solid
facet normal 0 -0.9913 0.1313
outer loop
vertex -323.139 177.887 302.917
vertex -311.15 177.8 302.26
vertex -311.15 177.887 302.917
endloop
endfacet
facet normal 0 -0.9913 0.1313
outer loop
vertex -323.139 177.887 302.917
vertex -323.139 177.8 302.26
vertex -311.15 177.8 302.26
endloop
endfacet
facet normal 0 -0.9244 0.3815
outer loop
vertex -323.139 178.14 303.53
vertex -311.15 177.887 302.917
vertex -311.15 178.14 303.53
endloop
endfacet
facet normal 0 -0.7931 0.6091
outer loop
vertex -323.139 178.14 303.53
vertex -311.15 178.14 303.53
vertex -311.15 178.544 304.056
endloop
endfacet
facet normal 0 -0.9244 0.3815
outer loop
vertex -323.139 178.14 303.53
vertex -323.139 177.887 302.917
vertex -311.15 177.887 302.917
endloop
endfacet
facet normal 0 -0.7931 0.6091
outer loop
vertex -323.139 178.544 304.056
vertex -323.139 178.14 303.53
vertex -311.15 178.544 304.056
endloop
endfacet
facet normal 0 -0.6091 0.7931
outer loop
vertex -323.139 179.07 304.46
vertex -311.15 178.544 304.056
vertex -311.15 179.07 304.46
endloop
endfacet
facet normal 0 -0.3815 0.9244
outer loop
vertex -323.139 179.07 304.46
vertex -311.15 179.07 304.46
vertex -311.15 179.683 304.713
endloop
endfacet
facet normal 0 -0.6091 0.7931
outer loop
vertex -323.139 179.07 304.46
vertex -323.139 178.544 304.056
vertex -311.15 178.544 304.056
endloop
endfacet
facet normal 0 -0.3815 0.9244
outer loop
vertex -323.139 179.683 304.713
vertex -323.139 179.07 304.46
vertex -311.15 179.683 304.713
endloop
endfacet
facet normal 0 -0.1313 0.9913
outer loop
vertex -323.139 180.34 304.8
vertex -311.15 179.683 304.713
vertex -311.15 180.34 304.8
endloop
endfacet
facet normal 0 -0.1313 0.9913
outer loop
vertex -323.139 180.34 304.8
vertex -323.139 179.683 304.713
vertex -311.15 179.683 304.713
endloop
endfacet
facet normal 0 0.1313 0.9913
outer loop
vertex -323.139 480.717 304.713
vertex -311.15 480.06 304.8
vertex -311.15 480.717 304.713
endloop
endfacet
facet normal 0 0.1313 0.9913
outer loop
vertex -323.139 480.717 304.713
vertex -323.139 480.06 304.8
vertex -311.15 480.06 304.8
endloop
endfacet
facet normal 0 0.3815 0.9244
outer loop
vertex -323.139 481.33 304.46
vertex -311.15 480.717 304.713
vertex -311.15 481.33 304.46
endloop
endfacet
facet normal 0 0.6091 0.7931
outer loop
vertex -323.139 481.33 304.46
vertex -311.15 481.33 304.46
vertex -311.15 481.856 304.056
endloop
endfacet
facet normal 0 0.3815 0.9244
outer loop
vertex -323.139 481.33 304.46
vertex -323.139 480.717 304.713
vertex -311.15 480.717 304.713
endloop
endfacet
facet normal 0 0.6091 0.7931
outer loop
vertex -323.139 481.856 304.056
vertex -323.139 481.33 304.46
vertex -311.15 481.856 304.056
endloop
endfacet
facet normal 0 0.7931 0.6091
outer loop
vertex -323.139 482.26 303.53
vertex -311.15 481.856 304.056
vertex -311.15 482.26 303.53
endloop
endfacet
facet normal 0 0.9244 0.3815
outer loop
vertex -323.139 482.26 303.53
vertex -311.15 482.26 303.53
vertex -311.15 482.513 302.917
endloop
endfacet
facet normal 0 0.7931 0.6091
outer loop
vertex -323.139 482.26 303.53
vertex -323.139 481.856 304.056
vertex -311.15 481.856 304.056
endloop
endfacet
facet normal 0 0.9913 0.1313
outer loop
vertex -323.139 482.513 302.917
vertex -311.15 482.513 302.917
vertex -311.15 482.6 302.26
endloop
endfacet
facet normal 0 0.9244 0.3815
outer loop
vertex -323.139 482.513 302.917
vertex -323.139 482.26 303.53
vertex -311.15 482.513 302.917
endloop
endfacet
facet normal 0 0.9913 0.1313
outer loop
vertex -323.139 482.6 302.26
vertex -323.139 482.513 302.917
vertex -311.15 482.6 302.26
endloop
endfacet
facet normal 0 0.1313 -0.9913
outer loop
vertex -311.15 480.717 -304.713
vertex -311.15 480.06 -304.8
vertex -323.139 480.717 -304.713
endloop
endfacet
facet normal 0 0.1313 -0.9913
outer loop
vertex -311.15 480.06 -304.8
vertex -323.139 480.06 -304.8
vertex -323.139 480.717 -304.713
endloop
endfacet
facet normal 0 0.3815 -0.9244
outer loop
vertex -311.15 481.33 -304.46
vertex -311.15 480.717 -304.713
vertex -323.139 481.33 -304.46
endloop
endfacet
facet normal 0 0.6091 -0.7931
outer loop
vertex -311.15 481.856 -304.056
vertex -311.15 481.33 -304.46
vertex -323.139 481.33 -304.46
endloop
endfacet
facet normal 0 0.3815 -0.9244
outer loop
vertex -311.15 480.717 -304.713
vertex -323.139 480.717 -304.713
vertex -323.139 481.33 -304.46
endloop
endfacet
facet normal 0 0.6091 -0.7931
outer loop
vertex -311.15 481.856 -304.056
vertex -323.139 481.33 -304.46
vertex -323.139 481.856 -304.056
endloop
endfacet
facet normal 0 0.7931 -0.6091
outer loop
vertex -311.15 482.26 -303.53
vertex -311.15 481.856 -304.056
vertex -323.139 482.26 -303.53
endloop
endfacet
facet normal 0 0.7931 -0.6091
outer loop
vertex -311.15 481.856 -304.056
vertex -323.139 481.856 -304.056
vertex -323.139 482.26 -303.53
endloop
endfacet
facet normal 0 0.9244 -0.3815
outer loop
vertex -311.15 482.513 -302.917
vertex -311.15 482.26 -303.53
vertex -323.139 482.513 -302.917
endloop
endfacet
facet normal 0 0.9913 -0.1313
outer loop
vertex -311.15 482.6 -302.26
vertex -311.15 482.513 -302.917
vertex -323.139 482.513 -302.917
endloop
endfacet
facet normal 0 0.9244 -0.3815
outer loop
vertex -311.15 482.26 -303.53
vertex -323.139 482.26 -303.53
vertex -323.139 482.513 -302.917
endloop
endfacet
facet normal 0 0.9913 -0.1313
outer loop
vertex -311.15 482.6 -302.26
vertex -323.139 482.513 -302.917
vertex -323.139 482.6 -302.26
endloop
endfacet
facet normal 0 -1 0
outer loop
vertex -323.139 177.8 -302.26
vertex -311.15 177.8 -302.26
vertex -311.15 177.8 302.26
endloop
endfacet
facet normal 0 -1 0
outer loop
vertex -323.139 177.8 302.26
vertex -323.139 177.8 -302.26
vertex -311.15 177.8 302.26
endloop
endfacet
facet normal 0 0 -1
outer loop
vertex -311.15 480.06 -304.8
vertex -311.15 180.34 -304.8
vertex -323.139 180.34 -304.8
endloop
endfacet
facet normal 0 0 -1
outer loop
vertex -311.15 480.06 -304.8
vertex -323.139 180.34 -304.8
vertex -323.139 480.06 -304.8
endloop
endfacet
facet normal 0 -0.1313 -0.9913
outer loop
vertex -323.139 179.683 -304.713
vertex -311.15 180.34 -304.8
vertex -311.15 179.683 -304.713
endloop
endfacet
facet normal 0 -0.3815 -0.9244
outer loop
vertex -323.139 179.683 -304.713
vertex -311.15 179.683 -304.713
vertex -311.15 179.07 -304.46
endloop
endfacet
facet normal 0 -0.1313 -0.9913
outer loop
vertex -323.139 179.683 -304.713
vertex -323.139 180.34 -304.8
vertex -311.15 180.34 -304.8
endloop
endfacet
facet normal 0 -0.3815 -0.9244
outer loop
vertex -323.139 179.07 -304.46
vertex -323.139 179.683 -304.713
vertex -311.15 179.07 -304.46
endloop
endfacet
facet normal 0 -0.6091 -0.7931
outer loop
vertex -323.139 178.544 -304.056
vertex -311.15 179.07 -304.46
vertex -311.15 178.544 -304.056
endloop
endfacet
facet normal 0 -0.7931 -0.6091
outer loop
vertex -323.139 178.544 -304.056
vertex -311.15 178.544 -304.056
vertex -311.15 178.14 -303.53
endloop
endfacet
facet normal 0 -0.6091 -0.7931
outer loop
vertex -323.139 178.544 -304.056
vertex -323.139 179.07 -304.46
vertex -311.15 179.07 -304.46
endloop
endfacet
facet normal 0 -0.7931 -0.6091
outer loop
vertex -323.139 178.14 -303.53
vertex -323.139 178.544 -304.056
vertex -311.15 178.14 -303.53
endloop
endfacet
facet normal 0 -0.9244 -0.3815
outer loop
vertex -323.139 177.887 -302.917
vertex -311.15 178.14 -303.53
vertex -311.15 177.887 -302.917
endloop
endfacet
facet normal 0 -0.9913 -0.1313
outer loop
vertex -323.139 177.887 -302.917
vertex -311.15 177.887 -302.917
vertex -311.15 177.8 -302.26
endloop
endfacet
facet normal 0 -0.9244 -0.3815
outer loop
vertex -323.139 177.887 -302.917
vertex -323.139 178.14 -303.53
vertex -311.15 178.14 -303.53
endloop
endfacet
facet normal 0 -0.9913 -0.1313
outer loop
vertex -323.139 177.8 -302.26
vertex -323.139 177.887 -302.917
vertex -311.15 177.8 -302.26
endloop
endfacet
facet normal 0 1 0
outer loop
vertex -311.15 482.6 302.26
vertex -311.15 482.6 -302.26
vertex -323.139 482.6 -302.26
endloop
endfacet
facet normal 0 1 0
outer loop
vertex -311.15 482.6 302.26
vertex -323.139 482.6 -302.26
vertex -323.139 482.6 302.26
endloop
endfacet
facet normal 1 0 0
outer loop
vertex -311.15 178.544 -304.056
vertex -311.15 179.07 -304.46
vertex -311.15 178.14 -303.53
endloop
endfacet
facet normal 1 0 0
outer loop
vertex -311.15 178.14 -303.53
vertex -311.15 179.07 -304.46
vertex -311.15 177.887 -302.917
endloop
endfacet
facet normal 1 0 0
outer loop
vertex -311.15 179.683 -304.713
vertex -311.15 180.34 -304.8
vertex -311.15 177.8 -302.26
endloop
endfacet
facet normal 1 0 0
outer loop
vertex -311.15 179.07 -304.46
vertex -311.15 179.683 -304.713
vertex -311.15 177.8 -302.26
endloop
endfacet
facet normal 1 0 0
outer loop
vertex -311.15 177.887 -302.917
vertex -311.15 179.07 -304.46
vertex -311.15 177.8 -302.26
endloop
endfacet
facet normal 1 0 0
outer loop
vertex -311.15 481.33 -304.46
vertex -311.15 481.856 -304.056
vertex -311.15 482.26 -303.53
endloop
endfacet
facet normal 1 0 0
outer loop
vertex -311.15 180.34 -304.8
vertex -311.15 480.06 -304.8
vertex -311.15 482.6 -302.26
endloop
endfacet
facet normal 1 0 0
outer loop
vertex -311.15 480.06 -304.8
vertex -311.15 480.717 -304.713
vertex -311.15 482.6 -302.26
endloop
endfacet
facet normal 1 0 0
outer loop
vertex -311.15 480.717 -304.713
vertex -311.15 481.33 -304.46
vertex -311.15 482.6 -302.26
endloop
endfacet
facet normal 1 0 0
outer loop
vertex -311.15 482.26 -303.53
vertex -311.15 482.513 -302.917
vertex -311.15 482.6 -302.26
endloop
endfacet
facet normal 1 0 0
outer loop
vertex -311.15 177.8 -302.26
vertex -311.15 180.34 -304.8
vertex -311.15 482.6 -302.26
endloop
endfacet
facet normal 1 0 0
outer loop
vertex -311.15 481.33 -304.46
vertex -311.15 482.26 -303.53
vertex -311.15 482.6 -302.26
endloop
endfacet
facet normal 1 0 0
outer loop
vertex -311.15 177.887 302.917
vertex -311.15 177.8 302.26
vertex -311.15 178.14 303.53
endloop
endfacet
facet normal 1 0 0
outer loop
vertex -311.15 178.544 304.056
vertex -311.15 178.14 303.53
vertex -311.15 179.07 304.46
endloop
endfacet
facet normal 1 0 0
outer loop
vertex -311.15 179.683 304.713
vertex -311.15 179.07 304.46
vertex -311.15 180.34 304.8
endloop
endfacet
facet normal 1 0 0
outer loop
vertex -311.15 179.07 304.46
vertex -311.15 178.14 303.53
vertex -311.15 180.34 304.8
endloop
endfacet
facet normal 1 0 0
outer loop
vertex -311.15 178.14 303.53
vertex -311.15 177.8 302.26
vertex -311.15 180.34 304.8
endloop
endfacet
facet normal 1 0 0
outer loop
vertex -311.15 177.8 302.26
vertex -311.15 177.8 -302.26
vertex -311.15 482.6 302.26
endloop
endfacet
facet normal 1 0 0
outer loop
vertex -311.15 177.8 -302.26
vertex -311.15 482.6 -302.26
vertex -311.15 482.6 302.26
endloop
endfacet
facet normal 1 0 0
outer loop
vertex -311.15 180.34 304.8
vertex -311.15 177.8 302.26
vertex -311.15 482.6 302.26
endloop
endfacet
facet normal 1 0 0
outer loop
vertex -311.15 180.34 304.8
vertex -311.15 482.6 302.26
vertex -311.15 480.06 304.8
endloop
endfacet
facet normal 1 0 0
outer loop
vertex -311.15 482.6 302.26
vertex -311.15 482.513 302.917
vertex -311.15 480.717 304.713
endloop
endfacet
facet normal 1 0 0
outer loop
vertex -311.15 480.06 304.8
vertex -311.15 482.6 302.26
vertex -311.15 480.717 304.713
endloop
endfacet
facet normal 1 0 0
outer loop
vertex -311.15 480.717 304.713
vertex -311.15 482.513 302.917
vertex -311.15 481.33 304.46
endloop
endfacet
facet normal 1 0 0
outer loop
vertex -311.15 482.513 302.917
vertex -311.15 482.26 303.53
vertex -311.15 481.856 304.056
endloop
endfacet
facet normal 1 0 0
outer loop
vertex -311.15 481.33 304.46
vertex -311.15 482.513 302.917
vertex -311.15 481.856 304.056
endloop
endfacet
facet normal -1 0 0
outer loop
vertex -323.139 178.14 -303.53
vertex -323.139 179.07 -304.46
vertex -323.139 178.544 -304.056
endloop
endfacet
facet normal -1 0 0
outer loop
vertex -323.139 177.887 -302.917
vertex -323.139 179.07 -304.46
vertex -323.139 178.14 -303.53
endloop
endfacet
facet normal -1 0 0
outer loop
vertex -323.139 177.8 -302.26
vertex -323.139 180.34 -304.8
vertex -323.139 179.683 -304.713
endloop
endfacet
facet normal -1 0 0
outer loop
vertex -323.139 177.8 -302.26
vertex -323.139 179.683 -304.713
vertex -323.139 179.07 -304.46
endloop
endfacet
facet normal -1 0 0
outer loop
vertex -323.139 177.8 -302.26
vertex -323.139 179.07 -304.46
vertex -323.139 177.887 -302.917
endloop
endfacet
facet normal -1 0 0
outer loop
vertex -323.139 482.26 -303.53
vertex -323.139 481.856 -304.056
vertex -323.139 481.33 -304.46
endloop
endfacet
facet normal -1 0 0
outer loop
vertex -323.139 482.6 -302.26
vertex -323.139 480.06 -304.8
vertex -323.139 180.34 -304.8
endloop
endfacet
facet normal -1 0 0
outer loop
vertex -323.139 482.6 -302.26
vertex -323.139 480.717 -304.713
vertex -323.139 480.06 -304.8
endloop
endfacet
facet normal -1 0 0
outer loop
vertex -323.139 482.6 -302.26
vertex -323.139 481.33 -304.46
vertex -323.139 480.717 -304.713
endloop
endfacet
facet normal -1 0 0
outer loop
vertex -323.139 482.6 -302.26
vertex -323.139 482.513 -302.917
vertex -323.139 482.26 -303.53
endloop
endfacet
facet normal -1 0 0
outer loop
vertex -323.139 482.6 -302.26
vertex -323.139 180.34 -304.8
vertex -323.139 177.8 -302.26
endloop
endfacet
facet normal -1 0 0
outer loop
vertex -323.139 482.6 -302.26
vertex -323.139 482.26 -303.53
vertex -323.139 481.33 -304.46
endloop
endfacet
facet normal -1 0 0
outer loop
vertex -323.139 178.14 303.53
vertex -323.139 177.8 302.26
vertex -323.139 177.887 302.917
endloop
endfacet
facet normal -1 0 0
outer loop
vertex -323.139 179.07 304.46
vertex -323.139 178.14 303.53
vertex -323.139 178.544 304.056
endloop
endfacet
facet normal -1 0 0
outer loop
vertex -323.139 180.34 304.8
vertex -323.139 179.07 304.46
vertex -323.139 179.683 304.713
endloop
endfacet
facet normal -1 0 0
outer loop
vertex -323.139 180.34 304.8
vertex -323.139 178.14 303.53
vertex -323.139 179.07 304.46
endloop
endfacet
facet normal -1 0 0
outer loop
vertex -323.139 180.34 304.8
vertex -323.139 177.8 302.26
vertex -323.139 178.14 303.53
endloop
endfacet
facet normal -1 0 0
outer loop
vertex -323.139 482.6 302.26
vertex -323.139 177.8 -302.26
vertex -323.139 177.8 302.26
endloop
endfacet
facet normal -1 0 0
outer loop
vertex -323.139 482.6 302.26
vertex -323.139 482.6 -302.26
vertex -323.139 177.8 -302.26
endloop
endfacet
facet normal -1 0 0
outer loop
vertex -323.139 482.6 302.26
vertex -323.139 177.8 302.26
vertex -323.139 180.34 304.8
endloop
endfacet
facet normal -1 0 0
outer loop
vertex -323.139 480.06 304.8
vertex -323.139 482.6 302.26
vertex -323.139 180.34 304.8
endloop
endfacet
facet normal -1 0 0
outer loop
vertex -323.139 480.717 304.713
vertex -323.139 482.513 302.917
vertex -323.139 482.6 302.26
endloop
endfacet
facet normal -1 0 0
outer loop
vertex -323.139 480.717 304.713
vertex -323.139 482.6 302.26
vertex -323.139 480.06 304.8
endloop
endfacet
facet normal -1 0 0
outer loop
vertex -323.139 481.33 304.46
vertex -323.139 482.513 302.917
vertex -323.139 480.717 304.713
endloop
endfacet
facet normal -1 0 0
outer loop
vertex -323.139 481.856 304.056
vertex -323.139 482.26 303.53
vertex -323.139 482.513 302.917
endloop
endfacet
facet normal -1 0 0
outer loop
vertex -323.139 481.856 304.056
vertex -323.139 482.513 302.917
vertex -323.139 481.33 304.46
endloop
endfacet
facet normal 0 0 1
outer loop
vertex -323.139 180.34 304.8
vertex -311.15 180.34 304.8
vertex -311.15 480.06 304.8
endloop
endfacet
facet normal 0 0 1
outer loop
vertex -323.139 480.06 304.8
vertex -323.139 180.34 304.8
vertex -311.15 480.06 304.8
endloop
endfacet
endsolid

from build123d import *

# Parameters (mm, degrees)
SKETCH1_W           = 609.6
SKETCH1_H           = 304.8
BOSS_EXTRUDE1_DEPTH = 11.9888
FILLET1_R           = 2.54


with BuildPart() as part:
    # Sketch1 → Boss-Extrude1 (new body)
    with BuildSketch(Plane.ZY.offset(311.15)):
        with Locations((0, 330.2)):
            Rectangle(SKETCH1_W, SKETCH1_H)
    extrude(amount=BOSS_EXTRUDE1_DEPTH)

    # Fillet1
    fillet1_edges = [part.edges().sort_by_distance(p)[0] for p in [
        (-317.1444, 482.6, -304.8),
        (-317.1444, 482.6, 304.8),
        (-317.1444, 177.8, 304.8),
        (-317.1444, 177.8, -304.8),
    ]]
    fillet(fillet1_edges, radius=FILLET1_R)


solid = part.part
